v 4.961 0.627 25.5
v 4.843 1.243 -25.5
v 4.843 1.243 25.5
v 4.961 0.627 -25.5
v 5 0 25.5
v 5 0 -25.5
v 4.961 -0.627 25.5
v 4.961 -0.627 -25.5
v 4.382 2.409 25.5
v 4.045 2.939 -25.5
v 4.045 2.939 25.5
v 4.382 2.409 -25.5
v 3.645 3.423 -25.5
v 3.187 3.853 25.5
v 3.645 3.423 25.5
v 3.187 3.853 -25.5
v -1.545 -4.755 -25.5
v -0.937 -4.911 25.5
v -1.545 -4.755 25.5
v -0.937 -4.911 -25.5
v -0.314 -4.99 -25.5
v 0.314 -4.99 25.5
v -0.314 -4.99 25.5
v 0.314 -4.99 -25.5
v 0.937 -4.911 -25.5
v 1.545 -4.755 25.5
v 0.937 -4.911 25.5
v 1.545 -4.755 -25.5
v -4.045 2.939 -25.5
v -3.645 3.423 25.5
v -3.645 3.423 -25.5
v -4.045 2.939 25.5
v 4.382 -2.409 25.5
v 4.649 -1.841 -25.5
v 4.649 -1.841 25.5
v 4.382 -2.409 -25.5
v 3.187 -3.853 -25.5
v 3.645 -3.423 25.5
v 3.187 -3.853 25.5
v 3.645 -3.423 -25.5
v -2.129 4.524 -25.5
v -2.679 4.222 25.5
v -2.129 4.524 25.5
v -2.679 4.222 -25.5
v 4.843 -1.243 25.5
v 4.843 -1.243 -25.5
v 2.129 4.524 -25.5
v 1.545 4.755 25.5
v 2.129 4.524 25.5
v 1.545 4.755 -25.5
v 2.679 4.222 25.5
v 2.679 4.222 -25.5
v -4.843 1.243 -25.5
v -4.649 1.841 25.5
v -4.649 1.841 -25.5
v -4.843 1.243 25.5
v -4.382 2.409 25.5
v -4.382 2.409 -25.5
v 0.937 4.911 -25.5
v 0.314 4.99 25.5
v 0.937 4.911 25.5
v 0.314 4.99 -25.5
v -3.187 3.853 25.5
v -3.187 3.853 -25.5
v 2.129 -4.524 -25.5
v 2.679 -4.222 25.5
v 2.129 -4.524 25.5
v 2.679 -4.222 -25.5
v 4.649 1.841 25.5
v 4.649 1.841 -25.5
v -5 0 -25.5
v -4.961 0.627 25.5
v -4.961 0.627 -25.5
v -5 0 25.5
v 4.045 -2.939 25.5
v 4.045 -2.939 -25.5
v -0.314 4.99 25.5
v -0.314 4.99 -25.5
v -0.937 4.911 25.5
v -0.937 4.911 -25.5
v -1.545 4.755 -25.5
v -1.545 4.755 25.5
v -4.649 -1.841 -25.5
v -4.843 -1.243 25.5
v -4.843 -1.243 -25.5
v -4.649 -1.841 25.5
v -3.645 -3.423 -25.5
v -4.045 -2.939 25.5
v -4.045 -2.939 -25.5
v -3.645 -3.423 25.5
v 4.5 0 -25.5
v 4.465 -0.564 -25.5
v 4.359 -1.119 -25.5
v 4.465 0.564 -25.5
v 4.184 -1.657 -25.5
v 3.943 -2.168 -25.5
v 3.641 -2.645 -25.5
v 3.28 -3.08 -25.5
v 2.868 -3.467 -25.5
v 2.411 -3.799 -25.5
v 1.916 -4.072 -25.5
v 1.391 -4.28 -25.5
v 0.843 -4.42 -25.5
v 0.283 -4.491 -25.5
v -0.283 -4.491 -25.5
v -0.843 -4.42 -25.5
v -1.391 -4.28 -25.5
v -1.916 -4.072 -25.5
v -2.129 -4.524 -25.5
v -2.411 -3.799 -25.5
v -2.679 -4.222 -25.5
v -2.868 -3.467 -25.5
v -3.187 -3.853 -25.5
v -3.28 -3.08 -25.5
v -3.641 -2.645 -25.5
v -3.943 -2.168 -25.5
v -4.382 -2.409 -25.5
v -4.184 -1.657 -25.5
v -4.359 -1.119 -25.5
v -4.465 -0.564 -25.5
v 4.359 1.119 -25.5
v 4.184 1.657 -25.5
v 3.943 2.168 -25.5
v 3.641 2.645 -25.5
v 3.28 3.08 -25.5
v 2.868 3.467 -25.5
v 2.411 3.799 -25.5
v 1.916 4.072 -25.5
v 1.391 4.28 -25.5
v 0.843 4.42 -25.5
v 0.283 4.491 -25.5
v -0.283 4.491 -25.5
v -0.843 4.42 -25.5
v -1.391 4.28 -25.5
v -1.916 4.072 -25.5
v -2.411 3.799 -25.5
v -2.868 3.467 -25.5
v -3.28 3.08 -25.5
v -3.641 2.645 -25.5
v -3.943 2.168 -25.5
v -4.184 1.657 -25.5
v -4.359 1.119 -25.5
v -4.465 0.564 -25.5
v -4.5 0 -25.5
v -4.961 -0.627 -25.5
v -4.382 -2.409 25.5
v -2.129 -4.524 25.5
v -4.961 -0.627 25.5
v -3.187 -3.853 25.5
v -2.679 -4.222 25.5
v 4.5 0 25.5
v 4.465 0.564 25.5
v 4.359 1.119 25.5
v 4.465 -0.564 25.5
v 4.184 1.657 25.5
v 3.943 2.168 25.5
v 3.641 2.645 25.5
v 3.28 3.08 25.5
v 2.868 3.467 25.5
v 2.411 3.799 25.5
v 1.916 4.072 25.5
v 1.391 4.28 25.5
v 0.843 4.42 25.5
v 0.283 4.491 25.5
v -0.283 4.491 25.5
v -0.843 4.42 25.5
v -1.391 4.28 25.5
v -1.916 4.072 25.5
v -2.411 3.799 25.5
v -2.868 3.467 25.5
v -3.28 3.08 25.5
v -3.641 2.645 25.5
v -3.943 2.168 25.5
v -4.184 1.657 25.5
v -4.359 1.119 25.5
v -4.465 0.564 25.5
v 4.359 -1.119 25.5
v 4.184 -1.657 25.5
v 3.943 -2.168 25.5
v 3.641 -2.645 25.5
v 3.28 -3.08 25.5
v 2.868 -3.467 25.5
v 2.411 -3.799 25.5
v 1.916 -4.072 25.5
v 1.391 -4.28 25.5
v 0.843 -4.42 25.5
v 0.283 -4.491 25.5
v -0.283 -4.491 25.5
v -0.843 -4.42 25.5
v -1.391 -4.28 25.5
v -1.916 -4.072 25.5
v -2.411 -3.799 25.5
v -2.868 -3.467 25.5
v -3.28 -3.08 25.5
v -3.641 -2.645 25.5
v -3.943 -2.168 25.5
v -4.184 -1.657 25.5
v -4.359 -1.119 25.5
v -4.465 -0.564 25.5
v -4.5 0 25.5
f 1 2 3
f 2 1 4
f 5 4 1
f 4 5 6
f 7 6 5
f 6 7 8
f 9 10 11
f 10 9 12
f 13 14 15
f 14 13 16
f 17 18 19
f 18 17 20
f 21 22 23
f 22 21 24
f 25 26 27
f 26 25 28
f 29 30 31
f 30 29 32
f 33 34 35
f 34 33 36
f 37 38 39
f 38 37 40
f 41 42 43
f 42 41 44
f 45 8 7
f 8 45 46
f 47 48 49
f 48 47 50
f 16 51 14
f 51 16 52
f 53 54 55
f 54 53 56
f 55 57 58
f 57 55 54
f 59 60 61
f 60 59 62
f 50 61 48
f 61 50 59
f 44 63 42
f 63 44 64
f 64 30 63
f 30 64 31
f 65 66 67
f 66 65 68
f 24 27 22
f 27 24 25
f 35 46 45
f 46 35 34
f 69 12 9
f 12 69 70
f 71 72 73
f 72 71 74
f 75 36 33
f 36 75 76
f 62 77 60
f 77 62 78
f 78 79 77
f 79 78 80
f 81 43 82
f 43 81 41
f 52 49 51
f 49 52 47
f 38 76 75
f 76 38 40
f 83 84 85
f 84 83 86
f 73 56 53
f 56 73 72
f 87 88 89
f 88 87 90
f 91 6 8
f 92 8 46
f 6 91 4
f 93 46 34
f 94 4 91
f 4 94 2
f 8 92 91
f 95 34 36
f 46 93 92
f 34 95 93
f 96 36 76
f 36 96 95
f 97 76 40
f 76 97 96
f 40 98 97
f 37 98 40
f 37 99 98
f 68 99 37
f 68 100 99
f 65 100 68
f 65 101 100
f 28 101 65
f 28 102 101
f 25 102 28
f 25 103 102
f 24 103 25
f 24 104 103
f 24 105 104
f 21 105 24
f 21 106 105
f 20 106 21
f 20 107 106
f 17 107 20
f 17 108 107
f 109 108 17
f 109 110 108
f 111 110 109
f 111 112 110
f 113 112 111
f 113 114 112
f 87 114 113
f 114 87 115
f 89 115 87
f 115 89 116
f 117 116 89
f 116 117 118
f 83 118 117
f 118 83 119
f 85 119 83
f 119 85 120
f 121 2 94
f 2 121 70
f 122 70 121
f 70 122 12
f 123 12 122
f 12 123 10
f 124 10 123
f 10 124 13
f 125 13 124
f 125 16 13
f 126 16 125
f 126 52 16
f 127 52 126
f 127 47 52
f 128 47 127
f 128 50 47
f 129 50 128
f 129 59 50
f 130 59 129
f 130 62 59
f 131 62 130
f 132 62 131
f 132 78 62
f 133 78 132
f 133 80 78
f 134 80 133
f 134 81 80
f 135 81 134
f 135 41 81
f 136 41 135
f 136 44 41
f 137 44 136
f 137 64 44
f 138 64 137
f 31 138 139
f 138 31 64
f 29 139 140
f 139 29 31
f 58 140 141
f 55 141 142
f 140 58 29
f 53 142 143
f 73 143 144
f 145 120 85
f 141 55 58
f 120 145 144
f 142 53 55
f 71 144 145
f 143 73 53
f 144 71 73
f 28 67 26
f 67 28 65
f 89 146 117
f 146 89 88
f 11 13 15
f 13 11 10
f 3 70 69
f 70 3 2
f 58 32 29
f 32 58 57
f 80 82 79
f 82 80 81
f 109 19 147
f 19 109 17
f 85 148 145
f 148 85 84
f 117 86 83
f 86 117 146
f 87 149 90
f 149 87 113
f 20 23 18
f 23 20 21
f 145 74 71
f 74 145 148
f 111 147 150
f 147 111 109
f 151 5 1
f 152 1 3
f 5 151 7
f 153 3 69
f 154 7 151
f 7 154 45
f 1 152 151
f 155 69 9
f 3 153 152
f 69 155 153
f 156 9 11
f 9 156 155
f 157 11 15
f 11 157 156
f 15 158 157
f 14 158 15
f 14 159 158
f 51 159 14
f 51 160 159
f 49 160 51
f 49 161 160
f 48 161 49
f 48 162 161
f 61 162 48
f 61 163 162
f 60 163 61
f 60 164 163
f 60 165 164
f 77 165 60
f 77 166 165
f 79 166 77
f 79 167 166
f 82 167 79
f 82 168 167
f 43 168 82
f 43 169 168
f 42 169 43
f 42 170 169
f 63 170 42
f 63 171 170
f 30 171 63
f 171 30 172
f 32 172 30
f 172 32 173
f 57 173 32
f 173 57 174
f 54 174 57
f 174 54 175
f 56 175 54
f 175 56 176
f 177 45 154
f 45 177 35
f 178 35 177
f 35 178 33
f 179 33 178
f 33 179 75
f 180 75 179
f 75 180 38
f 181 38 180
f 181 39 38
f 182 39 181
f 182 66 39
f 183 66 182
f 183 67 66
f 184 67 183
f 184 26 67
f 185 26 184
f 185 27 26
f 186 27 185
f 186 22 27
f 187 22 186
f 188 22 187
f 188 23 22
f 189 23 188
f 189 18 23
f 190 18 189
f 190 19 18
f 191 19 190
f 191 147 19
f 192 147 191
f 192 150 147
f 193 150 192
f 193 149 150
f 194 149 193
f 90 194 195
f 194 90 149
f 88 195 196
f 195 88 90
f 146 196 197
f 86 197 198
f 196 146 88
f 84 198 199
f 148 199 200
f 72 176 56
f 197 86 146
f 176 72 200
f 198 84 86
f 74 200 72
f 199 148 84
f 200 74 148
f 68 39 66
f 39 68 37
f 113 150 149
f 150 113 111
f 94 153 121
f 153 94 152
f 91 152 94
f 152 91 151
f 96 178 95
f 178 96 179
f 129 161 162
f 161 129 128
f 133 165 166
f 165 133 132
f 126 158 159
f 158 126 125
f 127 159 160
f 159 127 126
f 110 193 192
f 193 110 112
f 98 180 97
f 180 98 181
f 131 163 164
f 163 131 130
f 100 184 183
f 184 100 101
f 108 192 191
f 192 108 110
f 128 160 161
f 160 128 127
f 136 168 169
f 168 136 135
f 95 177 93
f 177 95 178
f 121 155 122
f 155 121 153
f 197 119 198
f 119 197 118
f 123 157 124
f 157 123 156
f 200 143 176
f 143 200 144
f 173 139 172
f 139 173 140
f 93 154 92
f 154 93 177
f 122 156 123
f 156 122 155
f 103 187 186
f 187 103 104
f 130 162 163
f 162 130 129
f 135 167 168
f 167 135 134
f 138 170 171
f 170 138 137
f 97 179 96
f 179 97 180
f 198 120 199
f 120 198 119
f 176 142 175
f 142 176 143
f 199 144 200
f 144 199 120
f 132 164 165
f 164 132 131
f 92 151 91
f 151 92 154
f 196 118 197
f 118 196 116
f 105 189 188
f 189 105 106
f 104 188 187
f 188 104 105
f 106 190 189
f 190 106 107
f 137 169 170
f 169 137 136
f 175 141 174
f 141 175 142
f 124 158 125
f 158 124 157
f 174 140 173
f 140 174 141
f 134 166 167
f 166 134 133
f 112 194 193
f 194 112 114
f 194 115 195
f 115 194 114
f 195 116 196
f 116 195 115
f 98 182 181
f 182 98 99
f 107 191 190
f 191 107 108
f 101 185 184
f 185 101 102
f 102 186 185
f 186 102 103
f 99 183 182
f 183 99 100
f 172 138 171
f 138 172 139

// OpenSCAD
$fn = 50;


difference() {
	union() {
		translate(v = [0, 0, -25.5000000000]) {
			cylinder(h = 51, r = 5.0000000000);
		}
	}
	union() {
		translate(v = [0, 0, -100.0000000000]) {
			cylinder(h = 200, r = 4.5000000000);
		}
	}
}
